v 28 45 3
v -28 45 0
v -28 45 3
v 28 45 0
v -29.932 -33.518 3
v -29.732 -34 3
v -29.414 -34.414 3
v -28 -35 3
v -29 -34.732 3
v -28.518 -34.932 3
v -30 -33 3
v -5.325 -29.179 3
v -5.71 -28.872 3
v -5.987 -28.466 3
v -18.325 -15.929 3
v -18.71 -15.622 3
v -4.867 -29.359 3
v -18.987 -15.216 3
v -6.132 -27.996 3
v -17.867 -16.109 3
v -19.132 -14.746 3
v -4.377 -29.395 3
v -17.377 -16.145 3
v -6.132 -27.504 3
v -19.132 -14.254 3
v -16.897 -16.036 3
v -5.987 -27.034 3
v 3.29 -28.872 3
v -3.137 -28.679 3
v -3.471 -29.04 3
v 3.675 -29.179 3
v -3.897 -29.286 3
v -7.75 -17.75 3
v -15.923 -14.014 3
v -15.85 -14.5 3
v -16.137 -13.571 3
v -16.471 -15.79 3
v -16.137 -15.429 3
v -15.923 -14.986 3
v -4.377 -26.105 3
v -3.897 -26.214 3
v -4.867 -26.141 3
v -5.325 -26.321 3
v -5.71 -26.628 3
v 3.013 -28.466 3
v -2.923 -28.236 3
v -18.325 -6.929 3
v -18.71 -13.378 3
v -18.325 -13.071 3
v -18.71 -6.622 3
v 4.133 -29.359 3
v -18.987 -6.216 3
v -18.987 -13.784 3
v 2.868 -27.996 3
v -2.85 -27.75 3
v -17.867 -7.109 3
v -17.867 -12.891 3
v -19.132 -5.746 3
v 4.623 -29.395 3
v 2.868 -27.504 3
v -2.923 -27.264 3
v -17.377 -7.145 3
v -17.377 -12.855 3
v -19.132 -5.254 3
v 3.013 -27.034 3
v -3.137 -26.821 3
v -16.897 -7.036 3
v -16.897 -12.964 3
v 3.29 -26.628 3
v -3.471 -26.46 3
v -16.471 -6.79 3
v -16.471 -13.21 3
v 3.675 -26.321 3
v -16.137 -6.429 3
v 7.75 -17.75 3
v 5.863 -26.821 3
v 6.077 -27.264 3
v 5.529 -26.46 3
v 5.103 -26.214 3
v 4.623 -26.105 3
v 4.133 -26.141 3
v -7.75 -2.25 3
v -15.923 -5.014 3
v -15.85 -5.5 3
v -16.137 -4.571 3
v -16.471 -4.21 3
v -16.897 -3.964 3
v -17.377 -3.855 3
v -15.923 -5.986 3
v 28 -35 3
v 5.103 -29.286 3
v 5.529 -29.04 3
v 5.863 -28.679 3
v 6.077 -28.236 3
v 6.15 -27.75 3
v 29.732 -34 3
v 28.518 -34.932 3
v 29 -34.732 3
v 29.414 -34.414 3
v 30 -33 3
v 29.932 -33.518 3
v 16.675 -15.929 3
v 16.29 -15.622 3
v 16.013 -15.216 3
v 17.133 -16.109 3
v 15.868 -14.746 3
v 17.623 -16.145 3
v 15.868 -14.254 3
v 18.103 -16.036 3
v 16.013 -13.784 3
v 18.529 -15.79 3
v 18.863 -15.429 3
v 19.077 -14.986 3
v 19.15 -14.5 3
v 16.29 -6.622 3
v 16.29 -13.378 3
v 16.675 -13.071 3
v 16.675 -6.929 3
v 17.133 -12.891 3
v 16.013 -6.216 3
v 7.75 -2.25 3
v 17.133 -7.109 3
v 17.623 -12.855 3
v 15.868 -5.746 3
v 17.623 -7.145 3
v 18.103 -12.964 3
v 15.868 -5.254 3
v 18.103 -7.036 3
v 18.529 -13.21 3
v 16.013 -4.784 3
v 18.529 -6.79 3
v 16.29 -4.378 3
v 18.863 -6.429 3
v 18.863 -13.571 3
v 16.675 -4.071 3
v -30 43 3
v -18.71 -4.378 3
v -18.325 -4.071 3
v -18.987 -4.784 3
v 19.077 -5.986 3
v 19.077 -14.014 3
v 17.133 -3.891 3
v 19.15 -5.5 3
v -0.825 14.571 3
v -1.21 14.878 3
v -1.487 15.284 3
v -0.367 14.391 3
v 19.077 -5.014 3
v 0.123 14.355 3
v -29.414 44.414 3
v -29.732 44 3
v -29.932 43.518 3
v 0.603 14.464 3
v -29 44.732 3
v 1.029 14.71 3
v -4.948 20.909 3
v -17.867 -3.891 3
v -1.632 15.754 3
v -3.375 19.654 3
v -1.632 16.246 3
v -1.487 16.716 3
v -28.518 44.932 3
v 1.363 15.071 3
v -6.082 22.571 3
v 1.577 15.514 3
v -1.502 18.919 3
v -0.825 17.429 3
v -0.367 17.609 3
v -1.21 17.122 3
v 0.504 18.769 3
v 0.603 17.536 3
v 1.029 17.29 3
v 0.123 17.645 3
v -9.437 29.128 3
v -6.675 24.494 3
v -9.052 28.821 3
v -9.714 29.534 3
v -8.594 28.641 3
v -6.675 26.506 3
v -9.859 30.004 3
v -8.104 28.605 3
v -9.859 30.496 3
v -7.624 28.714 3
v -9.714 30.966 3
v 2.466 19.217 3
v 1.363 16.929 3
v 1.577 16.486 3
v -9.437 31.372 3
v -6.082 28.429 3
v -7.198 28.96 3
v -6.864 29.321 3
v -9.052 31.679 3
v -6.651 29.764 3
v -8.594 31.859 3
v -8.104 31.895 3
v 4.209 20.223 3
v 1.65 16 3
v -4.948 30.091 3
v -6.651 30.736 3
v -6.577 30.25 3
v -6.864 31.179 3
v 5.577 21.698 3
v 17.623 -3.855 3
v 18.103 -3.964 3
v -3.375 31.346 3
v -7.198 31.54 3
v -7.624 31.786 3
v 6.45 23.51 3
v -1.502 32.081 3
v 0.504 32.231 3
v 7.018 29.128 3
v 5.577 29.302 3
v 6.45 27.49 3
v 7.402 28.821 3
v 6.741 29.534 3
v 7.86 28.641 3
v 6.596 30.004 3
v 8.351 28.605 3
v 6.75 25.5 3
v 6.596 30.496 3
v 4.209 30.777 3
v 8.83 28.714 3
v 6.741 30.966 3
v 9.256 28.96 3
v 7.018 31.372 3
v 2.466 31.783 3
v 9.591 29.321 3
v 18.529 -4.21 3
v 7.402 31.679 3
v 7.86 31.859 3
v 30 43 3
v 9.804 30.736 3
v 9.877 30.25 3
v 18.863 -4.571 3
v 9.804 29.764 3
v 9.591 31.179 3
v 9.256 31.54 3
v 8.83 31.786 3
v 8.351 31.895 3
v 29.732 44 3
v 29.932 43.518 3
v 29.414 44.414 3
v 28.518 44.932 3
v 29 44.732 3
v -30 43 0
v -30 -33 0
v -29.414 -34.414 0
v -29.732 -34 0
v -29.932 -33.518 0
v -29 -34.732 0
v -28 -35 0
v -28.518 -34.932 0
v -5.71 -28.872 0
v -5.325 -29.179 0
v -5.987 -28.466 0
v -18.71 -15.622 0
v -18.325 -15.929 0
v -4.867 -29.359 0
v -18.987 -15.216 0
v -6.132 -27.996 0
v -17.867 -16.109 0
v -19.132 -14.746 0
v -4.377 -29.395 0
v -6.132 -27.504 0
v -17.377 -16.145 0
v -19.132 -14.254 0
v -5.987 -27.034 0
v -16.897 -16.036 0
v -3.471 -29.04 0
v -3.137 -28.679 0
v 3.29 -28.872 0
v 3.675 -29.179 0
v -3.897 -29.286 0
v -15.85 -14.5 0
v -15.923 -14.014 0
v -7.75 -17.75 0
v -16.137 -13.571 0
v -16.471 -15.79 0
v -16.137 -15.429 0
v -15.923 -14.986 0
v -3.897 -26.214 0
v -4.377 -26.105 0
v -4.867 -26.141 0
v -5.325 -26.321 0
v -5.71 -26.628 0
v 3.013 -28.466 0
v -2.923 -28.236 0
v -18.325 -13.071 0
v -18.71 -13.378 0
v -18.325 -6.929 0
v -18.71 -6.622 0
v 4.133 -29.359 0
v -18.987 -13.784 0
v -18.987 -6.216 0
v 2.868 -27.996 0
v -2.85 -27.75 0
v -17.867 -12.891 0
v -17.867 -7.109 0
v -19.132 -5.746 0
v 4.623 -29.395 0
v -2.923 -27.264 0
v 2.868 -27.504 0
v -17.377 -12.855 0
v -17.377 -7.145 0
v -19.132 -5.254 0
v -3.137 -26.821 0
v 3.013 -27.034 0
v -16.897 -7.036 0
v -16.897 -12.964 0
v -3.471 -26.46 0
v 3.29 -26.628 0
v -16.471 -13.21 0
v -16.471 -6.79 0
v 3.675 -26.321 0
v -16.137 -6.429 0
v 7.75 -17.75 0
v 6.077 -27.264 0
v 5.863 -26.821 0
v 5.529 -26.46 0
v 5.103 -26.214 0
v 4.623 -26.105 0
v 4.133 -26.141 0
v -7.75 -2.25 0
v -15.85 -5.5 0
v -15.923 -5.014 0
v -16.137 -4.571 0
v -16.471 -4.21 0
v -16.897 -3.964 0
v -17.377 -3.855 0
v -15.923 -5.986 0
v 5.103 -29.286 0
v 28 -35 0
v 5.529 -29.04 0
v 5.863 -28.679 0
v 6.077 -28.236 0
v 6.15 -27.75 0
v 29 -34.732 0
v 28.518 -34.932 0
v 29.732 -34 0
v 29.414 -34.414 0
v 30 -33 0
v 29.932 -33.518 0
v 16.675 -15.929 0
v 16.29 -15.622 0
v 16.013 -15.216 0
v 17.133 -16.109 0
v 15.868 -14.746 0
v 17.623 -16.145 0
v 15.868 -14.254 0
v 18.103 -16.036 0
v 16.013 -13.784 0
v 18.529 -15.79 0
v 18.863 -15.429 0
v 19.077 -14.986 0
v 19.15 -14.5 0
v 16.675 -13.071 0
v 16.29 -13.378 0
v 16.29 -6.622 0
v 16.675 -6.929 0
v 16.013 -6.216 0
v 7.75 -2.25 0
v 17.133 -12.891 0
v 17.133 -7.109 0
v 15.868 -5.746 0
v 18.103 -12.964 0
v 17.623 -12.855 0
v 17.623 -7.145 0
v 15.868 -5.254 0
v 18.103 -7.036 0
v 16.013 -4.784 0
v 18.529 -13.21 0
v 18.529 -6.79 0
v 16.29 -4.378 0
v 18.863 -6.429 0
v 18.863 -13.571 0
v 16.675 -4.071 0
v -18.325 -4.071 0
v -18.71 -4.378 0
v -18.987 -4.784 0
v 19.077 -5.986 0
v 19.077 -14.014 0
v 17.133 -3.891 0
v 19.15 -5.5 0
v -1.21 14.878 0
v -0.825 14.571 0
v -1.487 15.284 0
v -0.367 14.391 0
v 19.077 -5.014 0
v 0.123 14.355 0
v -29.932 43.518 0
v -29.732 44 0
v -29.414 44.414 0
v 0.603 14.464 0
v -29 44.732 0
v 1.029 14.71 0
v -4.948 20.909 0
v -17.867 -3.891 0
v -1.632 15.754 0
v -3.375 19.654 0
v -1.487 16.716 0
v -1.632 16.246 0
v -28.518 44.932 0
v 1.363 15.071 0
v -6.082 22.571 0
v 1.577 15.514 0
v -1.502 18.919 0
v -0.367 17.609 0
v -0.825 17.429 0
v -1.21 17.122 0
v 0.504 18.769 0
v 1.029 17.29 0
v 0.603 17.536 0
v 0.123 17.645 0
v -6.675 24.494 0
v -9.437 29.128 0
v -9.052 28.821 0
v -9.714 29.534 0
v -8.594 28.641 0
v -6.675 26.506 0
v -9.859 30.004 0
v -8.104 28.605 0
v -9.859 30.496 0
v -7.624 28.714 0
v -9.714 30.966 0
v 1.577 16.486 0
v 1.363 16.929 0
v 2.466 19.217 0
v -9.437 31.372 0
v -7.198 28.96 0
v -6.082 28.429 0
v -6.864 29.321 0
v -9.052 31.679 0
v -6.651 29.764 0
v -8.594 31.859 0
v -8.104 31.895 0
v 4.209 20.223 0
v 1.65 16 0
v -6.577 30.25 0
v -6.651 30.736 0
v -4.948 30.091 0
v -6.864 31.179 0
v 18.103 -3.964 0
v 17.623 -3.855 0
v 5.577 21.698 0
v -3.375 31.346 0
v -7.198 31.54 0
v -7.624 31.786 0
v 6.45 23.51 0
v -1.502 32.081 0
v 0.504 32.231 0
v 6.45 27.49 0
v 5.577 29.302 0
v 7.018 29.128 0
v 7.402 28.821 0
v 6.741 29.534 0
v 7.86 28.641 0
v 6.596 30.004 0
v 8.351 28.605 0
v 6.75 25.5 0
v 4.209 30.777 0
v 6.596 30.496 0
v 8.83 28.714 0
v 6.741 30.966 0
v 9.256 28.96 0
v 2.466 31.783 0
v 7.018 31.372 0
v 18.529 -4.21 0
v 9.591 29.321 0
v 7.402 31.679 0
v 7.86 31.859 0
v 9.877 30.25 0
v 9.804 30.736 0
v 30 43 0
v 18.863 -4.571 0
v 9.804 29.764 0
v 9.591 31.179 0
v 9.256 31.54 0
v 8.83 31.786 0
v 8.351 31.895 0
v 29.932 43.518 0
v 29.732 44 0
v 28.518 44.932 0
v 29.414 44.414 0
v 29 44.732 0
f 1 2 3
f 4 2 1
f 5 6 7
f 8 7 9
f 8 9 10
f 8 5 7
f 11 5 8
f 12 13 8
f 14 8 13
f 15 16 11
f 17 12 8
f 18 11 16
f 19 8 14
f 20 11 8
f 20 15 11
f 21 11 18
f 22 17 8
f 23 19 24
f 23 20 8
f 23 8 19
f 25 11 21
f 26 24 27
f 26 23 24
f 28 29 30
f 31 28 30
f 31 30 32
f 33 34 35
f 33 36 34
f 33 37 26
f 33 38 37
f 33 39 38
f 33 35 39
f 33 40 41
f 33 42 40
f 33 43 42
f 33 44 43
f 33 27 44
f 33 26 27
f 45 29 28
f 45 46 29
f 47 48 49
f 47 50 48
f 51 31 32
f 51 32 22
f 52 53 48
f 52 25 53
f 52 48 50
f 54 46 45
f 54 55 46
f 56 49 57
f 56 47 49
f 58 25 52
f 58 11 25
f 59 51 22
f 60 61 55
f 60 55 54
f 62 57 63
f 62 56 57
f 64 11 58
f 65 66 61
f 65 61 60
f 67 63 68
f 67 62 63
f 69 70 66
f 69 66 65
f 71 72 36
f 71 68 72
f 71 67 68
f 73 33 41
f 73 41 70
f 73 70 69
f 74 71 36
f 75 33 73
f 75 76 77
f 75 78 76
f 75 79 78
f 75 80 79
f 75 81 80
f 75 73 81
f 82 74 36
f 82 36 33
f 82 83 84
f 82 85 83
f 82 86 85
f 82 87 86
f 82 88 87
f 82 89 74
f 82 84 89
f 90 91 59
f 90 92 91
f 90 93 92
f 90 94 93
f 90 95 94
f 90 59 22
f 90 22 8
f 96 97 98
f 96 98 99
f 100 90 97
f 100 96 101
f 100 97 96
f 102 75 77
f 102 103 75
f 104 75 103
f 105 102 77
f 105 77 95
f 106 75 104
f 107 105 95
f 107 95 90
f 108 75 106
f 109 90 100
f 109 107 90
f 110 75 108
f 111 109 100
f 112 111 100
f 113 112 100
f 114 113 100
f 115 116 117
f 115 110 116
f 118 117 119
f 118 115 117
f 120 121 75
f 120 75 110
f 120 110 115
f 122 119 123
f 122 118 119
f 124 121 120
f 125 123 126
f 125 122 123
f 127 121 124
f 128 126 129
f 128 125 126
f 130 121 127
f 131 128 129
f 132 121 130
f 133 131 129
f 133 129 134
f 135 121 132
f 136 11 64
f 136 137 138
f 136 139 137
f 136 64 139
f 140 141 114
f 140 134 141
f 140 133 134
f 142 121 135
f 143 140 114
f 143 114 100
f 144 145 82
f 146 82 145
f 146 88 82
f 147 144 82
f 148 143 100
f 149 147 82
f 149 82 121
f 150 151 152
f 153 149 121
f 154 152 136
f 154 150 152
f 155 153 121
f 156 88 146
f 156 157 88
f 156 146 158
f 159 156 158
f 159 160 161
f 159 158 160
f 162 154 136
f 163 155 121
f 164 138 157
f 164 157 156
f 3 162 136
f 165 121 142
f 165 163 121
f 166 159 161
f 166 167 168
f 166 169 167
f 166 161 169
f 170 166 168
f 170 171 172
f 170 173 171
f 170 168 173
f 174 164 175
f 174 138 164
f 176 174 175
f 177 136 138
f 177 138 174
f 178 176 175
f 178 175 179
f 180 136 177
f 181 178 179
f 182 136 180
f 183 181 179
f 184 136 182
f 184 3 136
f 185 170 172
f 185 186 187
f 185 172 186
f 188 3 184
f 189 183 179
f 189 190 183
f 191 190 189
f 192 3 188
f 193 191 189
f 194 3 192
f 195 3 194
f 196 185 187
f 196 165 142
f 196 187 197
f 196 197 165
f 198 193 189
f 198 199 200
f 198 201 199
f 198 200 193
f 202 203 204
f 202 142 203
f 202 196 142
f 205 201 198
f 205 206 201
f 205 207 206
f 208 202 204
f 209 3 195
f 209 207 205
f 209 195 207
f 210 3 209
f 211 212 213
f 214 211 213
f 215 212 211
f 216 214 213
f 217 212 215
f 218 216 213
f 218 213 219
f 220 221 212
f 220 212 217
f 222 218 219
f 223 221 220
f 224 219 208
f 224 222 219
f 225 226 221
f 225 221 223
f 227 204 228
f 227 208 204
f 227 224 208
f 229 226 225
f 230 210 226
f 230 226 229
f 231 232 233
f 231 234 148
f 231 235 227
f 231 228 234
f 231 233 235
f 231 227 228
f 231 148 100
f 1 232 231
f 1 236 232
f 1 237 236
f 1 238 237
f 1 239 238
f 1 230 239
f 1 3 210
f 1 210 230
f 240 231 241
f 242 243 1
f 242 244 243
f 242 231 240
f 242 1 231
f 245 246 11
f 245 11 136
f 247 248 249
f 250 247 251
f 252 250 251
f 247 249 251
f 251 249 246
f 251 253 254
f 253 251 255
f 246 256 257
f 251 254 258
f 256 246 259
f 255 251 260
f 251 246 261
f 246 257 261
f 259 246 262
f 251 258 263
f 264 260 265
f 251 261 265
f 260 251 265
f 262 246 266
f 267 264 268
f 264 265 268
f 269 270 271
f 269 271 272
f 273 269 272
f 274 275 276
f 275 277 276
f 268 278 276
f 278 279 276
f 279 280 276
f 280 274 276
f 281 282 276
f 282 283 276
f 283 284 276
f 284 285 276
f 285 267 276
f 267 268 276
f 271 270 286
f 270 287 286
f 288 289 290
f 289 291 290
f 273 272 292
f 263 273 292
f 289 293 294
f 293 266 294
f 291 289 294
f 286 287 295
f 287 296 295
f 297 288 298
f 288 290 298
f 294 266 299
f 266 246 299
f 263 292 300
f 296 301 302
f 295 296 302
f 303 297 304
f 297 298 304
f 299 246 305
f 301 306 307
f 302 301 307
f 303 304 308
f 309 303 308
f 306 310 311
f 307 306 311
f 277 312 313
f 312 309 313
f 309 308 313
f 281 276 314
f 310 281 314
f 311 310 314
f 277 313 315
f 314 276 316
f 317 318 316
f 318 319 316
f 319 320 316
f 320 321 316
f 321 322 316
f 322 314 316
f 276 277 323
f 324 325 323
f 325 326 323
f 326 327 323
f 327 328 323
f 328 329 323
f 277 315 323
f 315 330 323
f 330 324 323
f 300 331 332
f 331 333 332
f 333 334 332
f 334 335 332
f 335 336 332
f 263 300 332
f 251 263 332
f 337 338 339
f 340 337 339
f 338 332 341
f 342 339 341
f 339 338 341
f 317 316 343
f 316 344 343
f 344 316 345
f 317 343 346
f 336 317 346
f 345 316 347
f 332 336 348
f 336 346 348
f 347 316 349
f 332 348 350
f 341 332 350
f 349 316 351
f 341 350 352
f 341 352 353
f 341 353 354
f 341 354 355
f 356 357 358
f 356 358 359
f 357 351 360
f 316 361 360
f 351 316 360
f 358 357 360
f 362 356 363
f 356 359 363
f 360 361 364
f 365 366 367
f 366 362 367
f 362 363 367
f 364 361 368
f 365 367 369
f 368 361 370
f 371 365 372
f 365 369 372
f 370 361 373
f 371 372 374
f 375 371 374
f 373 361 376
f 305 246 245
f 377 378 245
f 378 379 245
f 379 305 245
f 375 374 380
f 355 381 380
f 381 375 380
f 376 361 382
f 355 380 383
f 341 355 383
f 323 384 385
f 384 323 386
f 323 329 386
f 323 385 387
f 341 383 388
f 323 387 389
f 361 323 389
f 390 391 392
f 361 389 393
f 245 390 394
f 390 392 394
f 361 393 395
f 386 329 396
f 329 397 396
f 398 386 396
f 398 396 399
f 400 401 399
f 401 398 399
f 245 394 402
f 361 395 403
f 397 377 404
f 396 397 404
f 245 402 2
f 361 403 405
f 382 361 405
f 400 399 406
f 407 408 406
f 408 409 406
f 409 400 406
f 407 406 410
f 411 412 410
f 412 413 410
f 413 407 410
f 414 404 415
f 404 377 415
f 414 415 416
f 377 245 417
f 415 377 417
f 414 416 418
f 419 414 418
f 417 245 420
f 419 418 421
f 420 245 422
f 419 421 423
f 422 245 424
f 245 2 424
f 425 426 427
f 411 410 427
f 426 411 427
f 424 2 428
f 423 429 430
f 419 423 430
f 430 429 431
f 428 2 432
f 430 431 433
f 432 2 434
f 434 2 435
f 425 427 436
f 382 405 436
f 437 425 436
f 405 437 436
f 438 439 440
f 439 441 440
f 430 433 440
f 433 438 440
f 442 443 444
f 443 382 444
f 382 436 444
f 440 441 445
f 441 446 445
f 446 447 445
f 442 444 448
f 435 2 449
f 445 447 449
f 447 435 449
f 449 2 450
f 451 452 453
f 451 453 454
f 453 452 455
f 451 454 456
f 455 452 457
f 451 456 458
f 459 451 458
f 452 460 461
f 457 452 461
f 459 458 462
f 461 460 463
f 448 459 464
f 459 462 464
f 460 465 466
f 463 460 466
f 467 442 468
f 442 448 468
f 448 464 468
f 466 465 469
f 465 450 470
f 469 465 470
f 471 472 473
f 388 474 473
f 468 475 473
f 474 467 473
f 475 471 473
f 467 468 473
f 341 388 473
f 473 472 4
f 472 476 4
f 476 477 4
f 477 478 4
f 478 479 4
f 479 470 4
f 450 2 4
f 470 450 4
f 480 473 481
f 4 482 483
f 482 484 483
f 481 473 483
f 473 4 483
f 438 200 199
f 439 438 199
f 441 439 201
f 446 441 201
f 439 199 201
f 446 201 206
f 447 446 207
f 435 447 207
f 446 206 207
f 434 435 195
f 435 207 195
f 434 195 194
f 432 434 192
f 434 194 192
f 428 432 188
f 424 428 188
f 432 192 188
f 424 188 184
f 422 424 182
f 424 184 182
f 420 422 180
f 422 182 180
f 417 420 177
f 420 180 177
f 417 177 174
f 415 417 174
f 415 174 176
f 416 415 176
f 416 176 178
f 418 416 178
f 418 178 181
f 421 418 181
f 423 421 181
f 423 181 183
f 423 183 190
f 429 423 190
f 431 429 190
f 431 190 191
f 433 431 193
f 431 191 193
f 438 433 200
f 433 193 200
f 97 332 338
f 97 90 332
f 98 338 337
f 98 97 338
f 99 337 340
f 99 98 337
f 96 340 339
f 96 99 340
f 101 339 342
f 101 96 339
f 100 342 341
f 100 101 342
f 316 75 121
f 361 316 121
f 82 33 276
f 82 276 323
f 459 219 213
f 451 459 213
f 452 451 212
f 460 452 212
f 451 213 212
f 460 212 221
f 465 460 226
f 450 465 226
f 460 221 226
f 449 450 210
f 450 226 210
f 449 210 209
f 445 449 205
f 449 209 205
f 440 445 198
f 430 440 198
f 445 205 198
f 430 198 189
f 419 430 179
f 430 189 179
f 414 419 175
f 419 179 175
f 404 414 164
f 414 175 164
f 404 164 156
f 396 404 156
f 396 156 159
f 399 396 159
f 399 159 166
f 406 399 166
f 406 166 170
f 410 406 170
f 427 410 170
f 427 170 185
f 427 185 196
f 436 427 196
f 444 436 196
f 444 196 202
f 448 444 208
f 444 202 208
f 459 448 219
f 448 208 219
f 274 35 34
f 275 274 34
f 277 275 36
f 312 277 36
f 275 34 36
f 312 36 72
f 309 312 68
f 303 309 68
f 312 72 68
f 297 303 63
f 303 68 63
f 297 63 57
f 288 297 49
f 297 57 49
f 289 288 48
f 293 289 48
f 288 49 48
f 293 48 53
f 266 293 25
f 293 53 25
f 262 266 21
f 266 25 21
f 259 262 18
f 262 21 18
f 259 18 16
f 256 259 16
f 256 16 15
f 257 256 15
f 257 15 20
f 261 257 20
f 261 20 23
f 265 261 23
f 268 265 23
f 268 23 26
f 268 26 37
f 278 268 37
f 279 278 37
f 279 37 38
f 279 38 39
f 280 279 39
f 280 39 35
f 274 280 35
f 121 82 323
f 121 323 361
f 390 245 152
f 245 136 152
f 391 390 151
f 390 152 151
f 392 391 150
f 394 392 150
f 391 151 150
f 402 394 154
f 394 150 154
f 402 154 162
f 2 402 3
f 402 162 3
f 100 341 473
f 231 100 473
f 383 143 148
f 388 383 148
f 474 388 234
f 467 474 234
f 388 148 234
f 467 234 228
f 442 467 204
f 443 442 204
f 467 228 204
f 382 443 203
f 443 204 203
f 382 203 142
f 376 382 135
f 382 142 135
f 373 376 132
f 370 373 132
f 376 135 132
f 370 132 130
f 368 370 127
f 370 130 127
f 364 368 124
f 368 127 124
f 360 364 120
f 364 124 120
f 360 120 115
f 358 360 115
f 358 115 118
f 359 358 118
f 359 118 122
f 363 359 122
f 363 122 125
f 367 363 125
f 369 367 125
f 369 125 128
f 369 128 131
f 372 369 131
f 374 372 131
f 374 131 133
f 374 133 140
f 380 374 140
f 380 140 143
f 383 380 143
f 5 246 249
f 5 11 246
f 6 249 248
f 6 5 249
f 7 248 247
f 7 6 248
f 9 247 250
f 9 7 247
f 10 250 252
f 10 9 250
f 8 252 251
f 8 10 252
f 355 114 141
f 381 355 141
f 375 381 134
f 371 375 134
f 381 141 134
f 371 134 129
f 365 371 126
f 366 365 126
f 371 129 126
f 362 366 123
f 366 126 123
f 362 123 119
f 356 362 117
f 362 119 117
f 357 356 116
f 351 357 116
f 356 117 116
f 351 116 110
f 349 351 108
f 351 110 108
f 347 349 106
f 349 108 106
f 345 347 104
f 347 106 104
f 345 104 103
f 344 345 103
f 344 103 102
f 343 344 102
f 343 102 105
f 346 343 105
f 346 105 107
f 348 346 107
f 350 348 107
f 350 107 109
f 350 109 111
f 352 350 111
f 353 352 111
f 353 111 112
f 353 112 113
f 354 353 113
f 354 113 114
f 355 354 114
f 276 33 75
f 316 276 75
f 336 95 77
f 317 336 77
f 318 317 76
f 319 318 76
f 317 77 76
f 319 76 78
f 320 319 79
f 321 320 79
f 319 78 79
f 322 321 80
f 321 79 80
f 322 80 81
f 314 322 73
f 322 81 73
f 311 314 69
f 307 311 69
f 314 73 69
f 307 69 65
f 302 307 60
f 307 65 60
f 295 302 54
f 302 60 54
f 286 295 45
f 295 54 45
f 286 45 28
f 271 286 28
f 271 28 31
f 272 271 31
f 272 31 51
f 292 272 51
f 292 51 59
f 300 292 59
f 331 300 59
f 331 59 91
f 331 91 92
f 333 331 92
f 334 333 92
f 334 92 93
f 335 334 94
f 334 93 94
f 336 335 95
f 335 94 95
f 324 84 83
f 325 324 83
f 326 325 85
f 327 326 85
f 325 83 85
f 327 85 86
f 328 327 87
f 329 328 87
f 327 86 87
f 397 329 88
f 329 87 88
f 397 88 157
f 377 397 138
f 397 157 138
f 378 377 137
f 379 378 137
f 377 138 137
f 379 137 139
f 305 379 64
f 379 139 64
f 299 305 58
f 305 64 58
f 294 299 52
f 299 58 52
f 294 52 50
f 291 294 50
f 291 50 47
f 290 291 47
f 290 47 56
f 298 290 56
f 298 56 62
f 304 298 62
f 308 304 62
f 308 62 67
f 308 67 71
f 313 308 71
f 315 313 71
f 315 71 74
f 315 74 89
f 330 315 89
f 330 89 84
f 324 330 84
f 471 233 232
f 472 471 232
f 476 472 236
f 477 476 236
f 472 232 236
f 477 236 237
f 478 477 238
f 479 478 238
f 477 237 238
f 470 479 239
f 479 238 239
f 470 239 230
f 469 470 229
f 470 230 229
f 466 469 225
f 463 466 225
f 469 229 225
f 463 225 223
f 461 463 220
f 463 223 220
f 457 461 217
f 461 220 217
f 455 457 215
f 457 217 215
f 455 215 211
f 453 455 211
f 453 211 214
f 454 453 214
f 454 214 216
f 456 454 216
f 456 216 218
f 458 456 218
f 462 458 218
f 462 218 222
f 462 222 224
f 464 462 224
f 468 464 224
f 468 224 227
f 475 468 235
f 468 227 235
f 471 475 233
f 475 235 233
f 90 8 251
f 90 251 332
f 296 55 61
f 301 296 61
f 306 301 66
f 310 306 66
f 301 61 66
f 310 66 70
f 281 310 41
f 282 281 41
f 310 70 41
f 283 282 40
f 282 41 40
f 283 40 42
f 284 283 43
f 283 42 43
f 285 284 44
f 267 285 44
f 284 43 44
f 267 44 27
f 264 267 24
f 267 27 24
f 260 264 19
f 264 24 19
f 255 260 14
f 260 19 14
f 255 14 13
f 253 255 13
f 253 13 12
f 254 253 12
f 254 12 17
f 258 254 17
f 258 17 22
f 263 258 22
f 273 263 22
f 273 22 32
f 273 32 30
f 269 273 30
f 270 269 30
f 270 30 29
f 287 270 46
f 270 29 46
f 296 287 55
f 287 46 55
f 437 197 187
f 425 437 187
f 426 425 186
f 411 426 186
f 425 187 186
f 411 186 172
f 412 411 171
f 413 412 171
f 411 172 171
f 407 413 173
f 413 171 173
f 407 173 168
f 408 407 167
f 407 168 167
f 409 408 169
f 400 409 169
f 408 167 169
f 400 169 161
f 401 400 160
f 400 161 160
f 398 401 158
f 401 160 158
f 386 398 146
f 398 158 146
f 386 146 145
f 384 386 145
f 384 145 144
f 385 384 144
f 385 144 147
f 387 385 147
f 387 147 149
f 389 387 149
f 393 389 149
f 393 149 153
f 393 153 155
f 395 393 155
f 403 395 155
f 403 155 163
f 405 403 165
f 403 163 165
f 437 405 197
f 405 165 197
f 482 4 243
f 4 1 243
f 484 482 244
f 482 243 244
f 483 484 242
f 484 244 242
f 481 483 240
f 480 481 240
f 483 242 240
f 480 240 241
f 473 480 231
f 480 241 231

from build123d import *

# Parameters (mm, degrees)
SKETCH_1_W          = 60
SKETCH_1_H          = 90
EXTRUDE_1_DEPTH     = 3
SKETCH_2_R          = 1.65
CUT_EXTRUDE_1_DEPTH = 3
SKETCH_5_W          = 15.5
SKETCH_5_H          = 15.5
CUT_EXTRUDE_4_DEPTH = 1000
SKETCH_3_R          = 1.65
CUT_EXTRUDE_2_DEPTH = 3
SKETCH_4_R          = 6.75
CUT_EXTRUDE_3_DEPTH = 3
FILLET_1_R          = 2
SKETCH_6_W          = 69.11106811
SKETCH_6_H          = 12.862943276
CUT_EXTRUDE_5_DEPTH = 1000
FILLET_2_R          = 2
SKETCH_7_R          = 1.65
CUT_EXTRUDE_6_DEPTH = 1000


with BuildPart() as part:
    # 草图1 → 凸台-拉伸1 (new body)
    with BuildSketch(Plane.XY):
        Rectangle(SKETCH_1_W, SKETCH_1_H)
    extrude(amount=EXTRUDE_1_DEPTH)

    # 草图2 → 切除-拉伸1 (cut)
    with BuildSketch(Plane.XY.offset(3)):
        with Locations((0, 16)):
            Circle(SKETCH_2_R)
        with Locations((-8.227241336, 30.25)):
            Circle(SKETCH_2_R)
        with Locations((8.227241336, 30.25)):
            Circle(SKETCH_2_R)
    extrude(amount=-CUT_EXTRUDE_1_DEPTH, mode=Mode.SUBTRACT)

    # 草图5 → 切除-拉伸4 (cut)
    with BuildSketch(Plane.XY.offset(3)):
        with Locations((0, -10)):
            Rectangle(SKETCH_5_W, SKETCH_5_H)
    extrude(amount=-CUT_EXTRUDE_4_DEPTH, mode=Mode.SUBTRACT)

    # 草图3 → 切除-拉伸2 (cut)
    with BuildSketch(Plane.XY.offset(3)):
        with Locations((4.5, -27.75)):
            Circle(SKETCH_3_R)
        with Locations((-4.5, -27.75)):
            Circle(SKETCH_3_R)
    extrude(amount=-CUT_EXTRUDE_2_DEPTH, mode=Mode.SUBTRACT)

    # 草图4 → 切除-拉伸3 (cut)
    with BuildSketch(Plane.XY.offset(3)):
        with Locations((0, 25.5)):
            Circle(SKETCH_4_R)
    extrude(amount=-CUT_EXTRUDE_3_DEPTH, mode=Mode.SUBTRACT)

    # 圆角1
    fillet_1_edges = [part.edges().sort_by_distance(p)[0] for p in [
        (-30, 45, 1.5),
        (30, 45, 1.5),
    ]]
    fillet(fillet_1_edges, radius=FILLET_1_R)

    # 草图6 → 切除-拉伸5 (cut)
    with BuildSketch(Plane.XY.offset(3)):
        with Locations((0, -41.431471638)):
            Rectangle(SKETCH_6_W, SKETCH_6_H)
    extrude(amount=-CUT_EXTRUDE_5_DEPTH, mode=Mode.SUBTRACT)

    # 圆角2
    fillet_2_edges = [part.edges().sort_by_distance(p)[0] for p in [
        (30, -35, 1.5),
        (-30, -35, 1.5),
    ]]
    fillet(fillet_2_edges, radius=FILLET_2_R)

    # 草图7 → 切除-拉伸6 (cut)
    with BuildSketch(Plane.XY.offset(3)):
        with Locations((17.5, -5.5)):
            Circle(SKETCH_7_R)
        with Locations((17.5, -14.5)):
            Circle(SKETCH_7_R)
        with Locations((-17.5, -5.5)):
            Circle(SKETCH_7_R)
        with Locations((-17.5, -14.5)):
            Circle(SKETCH_7_R)
    extrude(amount=-CUT_EXTRUDE_6_DEPTH, mode=Mode.SUBTRACT)


solid = part.part
